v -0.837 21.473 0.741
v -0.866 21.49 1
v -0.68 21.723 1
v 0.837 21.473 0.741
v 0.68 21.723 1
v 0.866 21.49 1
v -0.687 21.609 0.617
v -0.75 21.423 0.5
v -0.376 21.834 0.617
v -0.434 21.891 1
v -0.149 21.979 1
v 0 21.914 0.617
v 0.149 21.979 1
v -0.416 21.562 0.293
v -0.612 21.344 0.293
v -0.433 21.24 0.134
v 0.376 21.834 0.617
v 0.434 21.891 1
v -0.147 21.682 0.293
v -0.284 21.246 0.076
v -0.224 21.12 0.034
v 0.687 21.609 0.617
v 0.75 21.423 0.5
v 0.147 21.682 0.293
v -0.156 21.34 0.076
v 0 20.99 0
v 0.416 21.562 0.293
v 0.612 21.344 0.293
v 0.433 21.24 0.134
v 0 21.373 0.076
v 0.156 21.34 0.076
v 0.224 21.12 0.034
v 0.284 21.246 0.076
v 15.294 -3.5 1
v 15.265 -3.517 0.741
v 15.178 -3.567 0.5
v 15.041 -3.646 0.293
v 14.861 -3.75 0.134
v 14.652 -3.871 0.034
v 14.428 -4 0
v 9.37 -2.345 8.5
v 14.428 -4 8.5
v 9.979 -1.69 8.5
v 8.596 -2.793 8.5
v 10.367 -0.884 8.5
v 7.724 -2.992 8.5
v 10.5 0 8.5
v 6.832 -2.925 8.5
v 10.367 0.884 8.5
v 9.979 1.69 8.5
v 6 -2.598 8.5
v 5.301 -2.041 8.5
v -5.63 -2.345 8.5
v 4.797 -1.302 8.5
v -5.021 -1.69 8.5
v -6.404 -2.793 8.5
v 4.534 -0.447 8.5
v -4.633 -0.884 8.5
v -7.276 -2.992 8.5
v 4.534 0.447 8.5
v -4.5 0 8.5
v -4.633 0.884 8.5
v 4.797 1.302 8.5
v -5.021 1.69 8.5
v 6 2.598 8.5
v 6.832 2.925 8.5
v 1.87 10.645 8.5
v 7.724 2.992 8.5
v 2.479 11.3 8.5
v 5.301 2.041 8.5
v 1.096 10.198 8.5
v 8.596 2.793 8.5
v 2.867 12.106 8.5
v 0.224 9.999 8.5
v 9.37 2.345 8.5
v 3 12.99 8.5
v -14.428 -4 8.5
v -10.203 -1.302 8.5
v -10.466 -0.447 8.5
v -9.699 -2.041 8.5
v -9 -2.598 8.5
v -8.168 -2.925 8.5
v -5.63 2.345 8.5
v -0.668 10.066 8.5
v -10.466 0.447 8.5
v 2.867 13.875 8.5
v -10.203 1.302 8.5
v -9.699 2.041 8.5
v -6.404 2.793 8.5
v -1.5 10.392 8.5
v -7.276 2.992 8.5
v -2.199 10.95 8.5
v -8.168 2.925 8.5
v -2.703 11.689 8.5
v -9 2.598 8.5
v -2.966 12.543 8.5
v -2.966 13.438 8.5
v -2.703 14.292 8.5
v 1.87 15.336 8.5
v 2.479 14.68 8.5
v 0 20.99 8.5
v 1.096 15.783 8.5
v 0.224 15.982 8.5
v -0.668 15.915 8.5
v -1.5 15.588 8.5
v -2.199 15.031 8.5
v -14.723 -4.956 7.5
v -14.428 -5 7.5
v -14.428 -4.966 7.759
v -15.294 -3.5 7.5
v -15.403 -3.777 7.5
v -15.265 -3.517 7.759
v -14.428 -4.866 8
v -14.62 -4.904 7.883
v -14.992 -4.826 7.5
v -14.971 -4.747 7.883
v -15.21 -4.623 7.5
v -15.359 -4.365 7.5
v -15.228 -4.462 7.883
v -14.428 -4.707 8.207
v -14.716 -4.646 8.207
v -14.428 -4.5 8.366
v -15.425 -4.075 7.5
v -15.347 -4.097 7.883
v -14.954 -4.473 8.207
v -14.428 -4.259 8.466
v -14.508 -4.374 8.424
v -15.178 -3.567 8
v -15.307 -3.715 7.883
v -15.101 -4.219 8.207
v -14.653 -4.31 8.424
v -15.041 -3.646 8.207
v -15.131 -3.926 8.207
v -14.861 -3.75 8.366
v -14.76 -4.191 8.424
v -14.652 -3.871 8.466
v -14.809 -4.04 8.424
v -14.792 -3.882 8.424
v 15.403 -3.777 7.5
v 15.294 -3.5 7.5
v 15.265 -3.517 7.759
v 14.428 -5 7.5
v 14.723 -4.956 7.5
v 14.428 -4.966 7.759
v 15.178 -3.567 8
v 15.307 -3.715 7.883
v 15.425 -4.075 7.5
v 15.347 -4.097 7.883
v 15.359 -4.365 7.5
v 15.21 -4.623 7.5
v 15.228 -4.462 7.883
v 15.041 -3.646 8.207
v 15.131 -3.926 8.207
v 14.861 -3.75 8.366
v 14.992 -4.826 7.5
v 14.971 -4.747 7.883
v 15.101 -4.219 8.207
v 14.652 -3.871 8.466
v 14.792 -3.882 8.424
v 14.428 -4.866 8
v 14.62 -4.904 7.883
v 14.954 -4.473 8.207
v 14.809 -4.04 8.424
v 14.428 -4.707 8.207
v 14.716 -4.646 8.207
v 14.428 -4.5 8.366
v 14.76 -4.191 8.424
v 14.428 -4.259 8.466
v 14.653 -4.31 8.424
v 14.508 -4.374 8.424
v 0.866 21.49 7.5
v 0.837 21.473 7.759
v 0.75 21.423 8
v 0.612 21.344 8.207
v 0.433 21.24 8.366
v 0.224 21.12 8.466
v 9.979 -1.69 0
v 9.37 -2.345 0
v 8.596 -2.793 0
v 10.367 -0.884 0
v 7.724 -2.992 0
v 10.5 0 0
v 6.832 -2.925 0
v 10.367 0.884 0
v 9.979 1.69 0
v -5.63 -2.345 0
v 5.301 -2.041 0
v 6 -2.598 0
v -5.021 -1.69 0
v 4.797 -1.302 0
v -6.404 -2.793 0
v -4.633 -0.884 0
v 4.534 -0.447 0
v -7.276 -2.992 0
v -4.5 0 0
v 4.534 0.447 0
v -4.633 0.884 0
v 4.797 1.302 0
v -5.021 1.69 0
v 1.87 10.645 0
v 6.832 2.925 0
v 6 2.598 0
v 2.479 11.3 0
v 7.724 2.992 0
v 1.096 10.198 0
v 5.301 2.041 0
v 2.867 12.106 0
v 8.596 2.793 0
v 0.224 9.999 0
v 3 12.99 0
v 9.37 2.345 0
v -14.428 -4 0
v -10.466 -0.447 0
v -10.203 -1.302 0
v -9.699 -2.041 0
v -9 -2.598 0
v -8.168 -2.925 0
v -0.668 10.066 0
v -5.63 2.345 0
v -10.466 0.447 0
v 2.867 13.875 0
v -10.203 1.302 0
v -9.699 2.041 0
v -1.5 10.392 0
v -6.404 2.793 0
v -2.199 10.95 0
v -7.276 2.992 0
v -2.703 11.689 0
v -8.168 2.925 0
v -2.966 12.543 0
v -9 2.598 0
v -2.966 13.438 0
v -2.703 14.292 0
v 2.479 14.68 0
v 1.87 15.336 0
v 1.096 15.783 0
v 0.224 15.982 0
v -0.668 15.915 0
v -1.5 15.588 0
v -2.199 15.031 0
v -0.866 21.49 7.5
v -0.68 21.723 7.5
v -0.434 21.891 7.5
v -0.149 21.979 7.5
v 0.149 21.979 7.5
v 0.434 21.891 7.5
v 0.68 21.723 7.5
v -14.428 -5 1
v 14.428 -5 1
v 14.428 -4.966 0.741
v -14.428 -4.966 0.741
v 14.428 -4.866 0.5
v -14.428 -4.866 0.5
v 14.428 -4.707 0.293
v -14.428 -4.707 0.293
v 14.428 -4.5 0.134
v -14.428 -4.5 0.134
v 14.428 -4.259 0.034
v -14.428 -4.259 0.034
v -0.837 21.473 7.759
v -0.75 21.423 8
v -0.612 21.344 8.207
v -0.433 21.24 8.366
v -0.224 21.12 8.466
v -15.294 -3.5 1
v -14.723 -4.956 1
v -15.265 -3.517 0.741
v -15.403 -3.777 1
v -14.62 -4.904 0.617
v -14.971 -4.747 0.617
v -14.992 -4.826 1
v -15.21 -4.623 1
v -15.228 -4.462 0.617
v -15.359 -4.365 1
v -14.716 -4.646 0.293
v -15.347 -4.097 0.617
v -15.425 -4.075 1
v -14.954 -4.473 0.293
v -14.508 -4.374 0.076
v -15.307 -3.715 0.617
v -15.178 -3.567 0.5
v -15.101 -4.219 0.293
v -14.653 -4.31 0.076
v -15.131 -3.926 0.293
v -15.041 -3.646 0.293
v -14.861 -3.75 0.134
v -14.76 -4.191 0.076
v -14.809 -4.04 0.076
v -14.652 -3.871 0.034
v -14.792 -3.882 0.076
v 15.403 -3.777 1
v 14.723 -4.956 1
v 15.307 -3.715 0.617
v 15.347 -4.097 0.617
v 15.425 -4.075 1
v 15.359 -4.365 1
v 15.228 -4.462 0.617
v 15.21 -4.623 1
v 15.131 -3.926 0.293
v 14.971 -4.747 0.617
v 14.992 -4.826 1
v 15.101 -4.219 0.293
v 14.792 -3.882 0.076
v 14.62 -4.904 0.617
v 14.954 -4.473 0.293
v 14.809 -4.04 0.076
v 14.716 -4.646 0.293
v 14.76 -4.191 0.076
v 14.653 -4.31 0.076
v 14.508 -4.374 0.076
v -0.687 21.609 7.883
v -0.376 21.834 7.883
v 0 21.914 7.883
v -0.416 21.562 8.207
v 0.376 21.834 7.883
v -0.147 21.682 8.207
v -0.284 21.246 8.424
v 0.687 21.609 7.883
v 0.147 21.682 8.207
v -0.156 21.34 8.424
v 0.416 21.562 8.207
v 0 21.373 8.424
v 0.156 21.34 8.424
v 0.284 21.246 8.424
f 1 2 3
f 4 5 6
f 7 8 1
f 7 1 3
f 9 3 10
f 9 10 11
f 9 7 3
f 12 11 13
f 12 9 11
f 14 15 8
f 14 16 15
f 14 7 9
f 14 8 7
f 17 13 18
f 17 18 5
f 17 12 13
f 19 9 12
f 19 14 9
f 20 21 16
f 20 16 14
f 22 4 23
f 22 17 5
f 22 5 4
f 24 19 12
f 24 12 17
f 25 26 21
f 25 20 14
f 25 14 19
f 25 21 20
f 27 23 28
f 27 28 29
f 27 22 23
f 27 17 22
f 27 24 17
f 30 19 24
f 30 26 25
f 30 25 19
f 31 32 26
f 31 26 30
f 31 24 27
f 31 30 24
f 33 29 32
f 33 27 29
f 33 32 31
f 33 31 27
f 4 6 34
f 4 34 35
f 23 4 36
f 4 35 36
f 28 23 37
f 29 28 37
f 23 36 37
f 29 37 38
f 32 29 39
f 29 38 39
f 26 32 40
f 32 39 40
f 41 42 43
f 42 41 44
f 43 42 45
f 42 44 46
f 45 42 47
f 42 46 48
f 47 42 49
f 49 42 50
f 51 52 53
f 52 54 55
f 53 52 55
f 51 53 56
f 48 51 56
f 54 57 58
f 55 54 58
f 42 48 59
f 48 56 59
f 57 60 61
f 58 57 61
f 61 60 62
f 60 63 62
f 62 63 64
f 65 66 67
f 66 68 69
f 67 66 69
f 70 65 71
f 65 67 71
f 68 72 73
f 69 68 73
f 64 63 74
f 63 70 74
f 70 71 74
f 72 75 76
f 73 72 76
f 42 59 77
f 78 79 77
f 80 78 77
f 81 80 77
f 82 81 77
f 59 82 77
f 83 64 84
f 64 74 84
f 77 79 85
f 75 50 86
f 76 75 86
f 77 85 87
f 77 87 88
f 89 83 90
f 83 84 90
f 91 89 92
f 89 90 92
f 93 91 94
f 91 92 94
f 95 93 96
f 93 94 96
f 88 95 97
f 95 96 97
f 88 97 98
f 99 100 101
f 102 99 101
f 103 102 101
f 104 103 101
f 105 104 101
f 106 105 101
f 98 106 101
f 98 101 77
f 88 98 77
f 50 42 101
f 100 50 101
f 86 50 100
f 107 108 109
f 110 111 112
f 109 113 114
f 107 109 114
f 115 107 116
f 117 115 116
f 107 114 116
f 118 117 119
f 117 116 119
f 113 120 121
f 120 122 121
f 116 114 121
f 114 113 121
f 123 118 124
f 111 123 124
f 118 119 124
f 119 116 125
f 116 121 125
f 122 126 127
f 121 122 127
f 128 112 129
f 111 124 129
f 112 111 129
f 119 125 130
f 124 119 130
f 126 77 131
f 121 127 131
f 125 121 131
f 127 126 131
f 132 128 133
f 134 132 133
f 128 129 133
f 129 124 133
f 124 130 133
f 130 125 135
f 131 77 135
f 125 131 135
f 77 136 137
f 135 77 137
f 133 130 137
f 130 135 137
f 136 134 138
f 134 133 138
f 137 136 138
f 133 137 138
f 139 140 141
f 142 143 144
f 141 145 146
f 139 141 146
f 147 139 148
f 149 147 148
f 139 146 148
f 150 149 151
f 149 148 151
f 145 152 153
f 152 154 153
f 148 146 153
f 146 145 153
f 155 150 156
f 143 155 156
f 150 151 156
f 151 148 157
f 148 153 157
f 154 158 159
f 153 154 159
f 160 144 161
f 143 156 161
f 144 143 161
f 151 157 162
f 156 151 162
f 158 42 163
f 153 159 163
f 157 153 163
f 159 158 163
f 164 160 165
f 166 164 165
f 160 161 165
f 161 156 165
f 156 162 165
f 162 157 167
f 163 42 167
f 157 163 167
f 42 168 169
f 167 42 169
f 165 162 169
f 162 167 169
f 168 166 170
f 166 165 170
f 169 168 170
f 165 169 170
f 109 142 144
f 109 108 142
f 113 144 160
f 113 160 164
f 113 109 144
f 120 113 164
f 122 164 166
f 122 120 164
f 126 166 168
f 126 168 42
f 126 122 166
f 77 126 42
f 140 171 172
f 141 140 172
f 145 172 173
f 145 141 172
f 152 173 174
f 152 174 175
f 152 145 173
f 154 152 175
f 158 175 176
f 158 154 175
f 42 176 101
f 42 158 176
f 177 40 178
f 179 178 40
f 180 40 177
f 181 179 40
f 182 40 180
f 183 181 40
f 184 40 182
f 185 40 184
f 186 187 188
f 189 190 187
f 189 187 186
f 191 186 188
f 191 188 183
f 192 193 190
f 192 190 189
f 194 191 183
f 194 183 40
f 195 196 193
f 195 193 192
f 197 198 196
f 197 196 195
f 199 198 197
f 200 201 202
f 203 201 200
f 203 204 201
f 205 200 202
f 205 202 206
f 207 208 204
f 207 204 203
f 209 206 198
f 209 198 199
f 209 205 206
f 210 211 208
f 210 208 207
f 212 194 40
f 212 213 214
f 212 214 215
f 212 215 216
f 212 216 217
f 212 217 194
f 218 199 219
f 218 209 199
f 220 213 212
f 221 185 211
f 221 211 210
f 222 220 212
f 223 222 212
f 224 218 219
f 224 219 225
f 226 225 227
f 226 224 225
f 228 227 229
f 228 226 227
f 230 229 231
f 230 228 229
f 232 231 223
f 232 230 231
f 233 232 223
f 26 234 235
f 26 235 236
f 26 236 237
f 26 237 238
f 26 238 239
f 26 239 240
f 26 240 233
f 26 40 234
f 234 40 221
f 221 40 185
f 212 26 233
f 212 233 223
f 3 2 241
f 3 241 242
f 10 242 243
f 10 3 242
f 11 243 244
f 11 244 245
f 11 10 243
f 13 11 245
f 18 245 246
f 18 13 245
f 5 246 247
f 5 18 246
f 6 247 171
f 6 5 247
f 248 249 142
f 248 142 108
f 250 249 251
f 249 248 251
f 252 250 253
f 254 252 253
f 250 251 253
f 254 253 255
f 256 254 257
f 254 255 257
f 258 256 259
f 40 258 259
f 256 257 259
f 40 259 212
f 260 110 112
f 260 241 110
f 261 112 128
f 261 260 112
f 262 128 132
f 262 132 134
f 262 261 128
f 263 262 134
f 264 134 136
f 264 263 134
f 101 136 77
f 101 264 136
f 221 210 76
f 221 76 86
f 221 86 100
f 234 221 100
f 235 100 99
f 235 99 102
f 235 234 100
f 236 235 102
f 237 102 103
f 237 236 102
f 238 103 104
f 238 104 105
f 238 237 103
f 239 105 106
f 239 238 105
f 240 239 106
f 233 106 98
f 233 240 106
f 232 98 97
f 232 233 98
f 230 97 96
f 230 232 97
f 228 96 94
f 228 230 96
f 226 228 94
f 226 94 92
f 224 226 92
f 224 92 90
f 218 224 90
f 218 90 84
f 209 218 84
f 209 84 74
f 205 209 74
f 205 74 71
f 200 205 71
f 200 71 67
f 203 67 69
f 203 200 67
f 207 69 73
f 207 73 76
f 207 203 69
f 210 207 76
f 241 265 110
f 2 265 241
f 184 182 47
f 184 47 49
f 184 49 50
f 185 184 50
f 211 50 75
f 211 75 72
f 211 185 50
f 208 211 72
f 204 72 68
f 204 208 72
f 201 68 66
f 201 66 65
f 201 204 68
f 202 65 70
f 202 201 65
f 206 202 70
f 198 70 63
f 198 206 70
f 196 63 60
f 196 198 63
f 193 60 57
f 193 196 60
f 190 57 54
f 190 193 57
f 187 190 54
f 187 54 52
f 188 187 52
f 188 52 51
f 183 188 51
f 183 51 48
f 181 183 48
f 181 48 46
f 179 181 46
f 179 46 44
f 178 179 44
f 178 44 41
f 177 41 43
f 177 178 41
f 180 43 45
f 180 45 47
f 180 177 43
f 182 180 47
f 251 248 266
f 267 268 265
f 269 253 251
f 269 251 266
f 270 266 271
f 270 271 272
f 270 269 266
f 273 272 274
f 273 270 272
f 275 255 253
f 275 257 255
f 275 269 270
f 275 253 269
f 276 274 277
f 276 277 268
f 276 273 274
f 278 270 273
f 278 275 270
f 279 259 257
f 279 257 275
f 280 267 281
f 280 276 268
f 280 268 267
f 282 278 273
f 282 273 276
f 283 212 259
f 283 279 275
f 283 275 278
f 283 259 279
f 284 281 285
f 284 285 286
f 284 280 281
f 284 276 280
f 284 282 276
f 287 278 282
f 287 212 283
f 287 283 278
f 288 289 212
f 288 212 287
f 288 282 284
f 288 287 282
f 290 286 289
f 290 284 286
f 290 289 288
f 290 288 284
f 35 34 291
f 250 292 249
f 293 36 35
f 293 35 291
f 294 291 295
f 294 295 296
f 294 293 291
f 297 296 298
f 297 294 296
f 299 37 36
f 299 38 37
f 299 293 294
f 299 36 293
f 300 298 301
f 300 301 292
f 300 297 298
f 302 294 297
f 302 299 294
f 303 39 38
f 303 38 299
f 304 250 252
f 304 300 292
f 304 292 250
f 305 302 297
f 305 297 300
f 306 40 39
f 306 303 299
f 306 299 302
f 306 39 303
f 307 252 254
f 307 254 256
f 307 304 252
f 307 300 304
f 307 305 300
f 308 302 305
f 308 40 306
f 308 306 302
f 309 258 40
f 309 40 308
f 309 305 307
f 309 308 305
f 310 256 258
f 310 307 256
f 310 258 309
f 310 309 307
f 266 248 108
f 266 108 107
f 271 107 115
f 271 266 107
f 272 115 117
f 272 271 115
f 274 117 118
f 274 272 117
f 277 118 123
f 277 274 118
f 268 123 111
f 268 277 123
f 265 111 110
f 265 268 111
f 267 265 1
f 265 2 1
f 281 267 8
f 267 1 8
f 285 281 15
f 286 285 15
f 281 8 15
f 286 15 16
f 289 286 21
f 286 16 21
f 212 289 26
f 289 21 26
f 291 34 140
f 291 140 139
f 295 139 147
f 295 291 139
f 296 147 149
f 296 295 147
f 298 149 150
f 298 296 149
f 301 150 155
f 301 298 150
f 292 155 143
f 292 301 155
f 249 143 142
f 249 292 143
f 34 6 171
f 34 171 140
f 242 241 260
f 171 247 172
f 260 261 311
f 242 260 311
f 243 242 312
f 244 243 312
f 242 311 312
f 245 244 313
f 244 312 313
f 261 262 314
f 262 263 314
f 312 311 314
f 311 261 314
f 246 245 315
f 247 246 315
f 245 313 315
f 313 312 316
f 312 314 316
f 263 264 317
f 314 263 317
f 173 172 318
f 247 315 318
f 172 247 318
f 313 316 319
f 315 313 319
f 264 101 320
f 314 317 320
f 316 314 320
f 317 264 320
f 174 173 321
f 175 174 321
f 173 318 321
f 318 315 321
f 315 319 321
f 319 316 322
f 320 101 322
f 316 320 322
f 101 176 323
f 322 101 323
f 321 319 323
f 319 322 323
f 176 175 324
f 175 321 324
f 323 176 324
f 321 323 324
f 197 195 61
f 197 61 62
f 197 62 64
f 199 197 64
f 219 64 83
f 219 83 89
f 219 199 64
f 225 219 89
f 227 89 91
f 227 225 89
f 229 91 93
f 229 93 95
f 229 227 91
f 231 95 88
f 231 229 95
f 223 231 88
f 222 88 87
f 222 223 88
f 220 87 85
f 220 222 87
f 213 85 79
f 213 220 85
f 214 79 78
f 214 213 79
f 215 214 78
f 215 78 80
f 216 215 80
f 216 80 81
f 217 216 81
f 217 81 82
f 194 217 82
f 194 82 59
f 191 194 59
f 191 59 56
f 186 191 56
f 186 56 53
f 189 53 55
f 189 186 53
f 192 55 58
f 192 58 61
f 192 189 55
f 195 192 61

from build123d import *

# Parameters (mm, degrees)
ESQUISSE1_R        = 3
BOSS_EXTRU_1_DEPTH = 8.5
CONG_1_R           = 1


with BuildPart() as part:
    # Esquisse1 → Boss.-Extru.1 (new body)
    with BuildSketch(Plane.XY):
        with BuildLine():
            Line((0.866025404, 21.490381057), (15.294228634, -3.5))
            ThreePointArc((15.294228634, -3.5), (15.294228634, -4.5), (14.42820323, -5))
            Line((14.42820323, -5), (-14.42820323, -5))
            ThreePointArc((-14.42820323, -5), (-15.294228634, -4.5), (-15.294228634, -3.5))
            Line((-15.294228634, -3.5), (-0.866025404, 21.490381057))
            ThreePointArc((-0.866025404, 21.490381057), (0, 21.990381057), (0.866025404, 21.490381057))
        make_face()
        with Locations((-7.5, 0)):
            Circle(ESQUISSE1_R, mode=Mode.SUBTRACT)
        with Locations((7.5, 0)):
            Circle(ESQUISSE1_R, mode=Mode.SUBTRACT)
        with Locations((0, 12.990381057)):
            Circle(ESQUISSE1_R, mode=Mode.SUBTRACT)
    extrude(amount=BOSS_EXTRU_1_DEPTH)

    # Congé1
    cong_1_edges = [part.edges().sort_by_distance(p)[0] for p in [
        (-15.294228634, -4.5, 8.5),
        (0, -5, 8.5),
        (15.294228634, -4.5, 8.5),
        (8.080127019, 8.995190528, 8.5),
        (0, 21.990381057, 8.5),
        (8.080127019, 8.995190528, 0),
        (15.294228634, -4.5, 0),
        (0, -5, 0),
        (-15.294228634, -4.5, 0),
        (-8.080127019, 8.995190528, 0),
        (0, 21.990381057, 0),
        (-8.080127019, 8.995190528, 8.5),
    ]]
    fillet(cong_1_edges, radius=CONG_1_R)


solid = part.part
